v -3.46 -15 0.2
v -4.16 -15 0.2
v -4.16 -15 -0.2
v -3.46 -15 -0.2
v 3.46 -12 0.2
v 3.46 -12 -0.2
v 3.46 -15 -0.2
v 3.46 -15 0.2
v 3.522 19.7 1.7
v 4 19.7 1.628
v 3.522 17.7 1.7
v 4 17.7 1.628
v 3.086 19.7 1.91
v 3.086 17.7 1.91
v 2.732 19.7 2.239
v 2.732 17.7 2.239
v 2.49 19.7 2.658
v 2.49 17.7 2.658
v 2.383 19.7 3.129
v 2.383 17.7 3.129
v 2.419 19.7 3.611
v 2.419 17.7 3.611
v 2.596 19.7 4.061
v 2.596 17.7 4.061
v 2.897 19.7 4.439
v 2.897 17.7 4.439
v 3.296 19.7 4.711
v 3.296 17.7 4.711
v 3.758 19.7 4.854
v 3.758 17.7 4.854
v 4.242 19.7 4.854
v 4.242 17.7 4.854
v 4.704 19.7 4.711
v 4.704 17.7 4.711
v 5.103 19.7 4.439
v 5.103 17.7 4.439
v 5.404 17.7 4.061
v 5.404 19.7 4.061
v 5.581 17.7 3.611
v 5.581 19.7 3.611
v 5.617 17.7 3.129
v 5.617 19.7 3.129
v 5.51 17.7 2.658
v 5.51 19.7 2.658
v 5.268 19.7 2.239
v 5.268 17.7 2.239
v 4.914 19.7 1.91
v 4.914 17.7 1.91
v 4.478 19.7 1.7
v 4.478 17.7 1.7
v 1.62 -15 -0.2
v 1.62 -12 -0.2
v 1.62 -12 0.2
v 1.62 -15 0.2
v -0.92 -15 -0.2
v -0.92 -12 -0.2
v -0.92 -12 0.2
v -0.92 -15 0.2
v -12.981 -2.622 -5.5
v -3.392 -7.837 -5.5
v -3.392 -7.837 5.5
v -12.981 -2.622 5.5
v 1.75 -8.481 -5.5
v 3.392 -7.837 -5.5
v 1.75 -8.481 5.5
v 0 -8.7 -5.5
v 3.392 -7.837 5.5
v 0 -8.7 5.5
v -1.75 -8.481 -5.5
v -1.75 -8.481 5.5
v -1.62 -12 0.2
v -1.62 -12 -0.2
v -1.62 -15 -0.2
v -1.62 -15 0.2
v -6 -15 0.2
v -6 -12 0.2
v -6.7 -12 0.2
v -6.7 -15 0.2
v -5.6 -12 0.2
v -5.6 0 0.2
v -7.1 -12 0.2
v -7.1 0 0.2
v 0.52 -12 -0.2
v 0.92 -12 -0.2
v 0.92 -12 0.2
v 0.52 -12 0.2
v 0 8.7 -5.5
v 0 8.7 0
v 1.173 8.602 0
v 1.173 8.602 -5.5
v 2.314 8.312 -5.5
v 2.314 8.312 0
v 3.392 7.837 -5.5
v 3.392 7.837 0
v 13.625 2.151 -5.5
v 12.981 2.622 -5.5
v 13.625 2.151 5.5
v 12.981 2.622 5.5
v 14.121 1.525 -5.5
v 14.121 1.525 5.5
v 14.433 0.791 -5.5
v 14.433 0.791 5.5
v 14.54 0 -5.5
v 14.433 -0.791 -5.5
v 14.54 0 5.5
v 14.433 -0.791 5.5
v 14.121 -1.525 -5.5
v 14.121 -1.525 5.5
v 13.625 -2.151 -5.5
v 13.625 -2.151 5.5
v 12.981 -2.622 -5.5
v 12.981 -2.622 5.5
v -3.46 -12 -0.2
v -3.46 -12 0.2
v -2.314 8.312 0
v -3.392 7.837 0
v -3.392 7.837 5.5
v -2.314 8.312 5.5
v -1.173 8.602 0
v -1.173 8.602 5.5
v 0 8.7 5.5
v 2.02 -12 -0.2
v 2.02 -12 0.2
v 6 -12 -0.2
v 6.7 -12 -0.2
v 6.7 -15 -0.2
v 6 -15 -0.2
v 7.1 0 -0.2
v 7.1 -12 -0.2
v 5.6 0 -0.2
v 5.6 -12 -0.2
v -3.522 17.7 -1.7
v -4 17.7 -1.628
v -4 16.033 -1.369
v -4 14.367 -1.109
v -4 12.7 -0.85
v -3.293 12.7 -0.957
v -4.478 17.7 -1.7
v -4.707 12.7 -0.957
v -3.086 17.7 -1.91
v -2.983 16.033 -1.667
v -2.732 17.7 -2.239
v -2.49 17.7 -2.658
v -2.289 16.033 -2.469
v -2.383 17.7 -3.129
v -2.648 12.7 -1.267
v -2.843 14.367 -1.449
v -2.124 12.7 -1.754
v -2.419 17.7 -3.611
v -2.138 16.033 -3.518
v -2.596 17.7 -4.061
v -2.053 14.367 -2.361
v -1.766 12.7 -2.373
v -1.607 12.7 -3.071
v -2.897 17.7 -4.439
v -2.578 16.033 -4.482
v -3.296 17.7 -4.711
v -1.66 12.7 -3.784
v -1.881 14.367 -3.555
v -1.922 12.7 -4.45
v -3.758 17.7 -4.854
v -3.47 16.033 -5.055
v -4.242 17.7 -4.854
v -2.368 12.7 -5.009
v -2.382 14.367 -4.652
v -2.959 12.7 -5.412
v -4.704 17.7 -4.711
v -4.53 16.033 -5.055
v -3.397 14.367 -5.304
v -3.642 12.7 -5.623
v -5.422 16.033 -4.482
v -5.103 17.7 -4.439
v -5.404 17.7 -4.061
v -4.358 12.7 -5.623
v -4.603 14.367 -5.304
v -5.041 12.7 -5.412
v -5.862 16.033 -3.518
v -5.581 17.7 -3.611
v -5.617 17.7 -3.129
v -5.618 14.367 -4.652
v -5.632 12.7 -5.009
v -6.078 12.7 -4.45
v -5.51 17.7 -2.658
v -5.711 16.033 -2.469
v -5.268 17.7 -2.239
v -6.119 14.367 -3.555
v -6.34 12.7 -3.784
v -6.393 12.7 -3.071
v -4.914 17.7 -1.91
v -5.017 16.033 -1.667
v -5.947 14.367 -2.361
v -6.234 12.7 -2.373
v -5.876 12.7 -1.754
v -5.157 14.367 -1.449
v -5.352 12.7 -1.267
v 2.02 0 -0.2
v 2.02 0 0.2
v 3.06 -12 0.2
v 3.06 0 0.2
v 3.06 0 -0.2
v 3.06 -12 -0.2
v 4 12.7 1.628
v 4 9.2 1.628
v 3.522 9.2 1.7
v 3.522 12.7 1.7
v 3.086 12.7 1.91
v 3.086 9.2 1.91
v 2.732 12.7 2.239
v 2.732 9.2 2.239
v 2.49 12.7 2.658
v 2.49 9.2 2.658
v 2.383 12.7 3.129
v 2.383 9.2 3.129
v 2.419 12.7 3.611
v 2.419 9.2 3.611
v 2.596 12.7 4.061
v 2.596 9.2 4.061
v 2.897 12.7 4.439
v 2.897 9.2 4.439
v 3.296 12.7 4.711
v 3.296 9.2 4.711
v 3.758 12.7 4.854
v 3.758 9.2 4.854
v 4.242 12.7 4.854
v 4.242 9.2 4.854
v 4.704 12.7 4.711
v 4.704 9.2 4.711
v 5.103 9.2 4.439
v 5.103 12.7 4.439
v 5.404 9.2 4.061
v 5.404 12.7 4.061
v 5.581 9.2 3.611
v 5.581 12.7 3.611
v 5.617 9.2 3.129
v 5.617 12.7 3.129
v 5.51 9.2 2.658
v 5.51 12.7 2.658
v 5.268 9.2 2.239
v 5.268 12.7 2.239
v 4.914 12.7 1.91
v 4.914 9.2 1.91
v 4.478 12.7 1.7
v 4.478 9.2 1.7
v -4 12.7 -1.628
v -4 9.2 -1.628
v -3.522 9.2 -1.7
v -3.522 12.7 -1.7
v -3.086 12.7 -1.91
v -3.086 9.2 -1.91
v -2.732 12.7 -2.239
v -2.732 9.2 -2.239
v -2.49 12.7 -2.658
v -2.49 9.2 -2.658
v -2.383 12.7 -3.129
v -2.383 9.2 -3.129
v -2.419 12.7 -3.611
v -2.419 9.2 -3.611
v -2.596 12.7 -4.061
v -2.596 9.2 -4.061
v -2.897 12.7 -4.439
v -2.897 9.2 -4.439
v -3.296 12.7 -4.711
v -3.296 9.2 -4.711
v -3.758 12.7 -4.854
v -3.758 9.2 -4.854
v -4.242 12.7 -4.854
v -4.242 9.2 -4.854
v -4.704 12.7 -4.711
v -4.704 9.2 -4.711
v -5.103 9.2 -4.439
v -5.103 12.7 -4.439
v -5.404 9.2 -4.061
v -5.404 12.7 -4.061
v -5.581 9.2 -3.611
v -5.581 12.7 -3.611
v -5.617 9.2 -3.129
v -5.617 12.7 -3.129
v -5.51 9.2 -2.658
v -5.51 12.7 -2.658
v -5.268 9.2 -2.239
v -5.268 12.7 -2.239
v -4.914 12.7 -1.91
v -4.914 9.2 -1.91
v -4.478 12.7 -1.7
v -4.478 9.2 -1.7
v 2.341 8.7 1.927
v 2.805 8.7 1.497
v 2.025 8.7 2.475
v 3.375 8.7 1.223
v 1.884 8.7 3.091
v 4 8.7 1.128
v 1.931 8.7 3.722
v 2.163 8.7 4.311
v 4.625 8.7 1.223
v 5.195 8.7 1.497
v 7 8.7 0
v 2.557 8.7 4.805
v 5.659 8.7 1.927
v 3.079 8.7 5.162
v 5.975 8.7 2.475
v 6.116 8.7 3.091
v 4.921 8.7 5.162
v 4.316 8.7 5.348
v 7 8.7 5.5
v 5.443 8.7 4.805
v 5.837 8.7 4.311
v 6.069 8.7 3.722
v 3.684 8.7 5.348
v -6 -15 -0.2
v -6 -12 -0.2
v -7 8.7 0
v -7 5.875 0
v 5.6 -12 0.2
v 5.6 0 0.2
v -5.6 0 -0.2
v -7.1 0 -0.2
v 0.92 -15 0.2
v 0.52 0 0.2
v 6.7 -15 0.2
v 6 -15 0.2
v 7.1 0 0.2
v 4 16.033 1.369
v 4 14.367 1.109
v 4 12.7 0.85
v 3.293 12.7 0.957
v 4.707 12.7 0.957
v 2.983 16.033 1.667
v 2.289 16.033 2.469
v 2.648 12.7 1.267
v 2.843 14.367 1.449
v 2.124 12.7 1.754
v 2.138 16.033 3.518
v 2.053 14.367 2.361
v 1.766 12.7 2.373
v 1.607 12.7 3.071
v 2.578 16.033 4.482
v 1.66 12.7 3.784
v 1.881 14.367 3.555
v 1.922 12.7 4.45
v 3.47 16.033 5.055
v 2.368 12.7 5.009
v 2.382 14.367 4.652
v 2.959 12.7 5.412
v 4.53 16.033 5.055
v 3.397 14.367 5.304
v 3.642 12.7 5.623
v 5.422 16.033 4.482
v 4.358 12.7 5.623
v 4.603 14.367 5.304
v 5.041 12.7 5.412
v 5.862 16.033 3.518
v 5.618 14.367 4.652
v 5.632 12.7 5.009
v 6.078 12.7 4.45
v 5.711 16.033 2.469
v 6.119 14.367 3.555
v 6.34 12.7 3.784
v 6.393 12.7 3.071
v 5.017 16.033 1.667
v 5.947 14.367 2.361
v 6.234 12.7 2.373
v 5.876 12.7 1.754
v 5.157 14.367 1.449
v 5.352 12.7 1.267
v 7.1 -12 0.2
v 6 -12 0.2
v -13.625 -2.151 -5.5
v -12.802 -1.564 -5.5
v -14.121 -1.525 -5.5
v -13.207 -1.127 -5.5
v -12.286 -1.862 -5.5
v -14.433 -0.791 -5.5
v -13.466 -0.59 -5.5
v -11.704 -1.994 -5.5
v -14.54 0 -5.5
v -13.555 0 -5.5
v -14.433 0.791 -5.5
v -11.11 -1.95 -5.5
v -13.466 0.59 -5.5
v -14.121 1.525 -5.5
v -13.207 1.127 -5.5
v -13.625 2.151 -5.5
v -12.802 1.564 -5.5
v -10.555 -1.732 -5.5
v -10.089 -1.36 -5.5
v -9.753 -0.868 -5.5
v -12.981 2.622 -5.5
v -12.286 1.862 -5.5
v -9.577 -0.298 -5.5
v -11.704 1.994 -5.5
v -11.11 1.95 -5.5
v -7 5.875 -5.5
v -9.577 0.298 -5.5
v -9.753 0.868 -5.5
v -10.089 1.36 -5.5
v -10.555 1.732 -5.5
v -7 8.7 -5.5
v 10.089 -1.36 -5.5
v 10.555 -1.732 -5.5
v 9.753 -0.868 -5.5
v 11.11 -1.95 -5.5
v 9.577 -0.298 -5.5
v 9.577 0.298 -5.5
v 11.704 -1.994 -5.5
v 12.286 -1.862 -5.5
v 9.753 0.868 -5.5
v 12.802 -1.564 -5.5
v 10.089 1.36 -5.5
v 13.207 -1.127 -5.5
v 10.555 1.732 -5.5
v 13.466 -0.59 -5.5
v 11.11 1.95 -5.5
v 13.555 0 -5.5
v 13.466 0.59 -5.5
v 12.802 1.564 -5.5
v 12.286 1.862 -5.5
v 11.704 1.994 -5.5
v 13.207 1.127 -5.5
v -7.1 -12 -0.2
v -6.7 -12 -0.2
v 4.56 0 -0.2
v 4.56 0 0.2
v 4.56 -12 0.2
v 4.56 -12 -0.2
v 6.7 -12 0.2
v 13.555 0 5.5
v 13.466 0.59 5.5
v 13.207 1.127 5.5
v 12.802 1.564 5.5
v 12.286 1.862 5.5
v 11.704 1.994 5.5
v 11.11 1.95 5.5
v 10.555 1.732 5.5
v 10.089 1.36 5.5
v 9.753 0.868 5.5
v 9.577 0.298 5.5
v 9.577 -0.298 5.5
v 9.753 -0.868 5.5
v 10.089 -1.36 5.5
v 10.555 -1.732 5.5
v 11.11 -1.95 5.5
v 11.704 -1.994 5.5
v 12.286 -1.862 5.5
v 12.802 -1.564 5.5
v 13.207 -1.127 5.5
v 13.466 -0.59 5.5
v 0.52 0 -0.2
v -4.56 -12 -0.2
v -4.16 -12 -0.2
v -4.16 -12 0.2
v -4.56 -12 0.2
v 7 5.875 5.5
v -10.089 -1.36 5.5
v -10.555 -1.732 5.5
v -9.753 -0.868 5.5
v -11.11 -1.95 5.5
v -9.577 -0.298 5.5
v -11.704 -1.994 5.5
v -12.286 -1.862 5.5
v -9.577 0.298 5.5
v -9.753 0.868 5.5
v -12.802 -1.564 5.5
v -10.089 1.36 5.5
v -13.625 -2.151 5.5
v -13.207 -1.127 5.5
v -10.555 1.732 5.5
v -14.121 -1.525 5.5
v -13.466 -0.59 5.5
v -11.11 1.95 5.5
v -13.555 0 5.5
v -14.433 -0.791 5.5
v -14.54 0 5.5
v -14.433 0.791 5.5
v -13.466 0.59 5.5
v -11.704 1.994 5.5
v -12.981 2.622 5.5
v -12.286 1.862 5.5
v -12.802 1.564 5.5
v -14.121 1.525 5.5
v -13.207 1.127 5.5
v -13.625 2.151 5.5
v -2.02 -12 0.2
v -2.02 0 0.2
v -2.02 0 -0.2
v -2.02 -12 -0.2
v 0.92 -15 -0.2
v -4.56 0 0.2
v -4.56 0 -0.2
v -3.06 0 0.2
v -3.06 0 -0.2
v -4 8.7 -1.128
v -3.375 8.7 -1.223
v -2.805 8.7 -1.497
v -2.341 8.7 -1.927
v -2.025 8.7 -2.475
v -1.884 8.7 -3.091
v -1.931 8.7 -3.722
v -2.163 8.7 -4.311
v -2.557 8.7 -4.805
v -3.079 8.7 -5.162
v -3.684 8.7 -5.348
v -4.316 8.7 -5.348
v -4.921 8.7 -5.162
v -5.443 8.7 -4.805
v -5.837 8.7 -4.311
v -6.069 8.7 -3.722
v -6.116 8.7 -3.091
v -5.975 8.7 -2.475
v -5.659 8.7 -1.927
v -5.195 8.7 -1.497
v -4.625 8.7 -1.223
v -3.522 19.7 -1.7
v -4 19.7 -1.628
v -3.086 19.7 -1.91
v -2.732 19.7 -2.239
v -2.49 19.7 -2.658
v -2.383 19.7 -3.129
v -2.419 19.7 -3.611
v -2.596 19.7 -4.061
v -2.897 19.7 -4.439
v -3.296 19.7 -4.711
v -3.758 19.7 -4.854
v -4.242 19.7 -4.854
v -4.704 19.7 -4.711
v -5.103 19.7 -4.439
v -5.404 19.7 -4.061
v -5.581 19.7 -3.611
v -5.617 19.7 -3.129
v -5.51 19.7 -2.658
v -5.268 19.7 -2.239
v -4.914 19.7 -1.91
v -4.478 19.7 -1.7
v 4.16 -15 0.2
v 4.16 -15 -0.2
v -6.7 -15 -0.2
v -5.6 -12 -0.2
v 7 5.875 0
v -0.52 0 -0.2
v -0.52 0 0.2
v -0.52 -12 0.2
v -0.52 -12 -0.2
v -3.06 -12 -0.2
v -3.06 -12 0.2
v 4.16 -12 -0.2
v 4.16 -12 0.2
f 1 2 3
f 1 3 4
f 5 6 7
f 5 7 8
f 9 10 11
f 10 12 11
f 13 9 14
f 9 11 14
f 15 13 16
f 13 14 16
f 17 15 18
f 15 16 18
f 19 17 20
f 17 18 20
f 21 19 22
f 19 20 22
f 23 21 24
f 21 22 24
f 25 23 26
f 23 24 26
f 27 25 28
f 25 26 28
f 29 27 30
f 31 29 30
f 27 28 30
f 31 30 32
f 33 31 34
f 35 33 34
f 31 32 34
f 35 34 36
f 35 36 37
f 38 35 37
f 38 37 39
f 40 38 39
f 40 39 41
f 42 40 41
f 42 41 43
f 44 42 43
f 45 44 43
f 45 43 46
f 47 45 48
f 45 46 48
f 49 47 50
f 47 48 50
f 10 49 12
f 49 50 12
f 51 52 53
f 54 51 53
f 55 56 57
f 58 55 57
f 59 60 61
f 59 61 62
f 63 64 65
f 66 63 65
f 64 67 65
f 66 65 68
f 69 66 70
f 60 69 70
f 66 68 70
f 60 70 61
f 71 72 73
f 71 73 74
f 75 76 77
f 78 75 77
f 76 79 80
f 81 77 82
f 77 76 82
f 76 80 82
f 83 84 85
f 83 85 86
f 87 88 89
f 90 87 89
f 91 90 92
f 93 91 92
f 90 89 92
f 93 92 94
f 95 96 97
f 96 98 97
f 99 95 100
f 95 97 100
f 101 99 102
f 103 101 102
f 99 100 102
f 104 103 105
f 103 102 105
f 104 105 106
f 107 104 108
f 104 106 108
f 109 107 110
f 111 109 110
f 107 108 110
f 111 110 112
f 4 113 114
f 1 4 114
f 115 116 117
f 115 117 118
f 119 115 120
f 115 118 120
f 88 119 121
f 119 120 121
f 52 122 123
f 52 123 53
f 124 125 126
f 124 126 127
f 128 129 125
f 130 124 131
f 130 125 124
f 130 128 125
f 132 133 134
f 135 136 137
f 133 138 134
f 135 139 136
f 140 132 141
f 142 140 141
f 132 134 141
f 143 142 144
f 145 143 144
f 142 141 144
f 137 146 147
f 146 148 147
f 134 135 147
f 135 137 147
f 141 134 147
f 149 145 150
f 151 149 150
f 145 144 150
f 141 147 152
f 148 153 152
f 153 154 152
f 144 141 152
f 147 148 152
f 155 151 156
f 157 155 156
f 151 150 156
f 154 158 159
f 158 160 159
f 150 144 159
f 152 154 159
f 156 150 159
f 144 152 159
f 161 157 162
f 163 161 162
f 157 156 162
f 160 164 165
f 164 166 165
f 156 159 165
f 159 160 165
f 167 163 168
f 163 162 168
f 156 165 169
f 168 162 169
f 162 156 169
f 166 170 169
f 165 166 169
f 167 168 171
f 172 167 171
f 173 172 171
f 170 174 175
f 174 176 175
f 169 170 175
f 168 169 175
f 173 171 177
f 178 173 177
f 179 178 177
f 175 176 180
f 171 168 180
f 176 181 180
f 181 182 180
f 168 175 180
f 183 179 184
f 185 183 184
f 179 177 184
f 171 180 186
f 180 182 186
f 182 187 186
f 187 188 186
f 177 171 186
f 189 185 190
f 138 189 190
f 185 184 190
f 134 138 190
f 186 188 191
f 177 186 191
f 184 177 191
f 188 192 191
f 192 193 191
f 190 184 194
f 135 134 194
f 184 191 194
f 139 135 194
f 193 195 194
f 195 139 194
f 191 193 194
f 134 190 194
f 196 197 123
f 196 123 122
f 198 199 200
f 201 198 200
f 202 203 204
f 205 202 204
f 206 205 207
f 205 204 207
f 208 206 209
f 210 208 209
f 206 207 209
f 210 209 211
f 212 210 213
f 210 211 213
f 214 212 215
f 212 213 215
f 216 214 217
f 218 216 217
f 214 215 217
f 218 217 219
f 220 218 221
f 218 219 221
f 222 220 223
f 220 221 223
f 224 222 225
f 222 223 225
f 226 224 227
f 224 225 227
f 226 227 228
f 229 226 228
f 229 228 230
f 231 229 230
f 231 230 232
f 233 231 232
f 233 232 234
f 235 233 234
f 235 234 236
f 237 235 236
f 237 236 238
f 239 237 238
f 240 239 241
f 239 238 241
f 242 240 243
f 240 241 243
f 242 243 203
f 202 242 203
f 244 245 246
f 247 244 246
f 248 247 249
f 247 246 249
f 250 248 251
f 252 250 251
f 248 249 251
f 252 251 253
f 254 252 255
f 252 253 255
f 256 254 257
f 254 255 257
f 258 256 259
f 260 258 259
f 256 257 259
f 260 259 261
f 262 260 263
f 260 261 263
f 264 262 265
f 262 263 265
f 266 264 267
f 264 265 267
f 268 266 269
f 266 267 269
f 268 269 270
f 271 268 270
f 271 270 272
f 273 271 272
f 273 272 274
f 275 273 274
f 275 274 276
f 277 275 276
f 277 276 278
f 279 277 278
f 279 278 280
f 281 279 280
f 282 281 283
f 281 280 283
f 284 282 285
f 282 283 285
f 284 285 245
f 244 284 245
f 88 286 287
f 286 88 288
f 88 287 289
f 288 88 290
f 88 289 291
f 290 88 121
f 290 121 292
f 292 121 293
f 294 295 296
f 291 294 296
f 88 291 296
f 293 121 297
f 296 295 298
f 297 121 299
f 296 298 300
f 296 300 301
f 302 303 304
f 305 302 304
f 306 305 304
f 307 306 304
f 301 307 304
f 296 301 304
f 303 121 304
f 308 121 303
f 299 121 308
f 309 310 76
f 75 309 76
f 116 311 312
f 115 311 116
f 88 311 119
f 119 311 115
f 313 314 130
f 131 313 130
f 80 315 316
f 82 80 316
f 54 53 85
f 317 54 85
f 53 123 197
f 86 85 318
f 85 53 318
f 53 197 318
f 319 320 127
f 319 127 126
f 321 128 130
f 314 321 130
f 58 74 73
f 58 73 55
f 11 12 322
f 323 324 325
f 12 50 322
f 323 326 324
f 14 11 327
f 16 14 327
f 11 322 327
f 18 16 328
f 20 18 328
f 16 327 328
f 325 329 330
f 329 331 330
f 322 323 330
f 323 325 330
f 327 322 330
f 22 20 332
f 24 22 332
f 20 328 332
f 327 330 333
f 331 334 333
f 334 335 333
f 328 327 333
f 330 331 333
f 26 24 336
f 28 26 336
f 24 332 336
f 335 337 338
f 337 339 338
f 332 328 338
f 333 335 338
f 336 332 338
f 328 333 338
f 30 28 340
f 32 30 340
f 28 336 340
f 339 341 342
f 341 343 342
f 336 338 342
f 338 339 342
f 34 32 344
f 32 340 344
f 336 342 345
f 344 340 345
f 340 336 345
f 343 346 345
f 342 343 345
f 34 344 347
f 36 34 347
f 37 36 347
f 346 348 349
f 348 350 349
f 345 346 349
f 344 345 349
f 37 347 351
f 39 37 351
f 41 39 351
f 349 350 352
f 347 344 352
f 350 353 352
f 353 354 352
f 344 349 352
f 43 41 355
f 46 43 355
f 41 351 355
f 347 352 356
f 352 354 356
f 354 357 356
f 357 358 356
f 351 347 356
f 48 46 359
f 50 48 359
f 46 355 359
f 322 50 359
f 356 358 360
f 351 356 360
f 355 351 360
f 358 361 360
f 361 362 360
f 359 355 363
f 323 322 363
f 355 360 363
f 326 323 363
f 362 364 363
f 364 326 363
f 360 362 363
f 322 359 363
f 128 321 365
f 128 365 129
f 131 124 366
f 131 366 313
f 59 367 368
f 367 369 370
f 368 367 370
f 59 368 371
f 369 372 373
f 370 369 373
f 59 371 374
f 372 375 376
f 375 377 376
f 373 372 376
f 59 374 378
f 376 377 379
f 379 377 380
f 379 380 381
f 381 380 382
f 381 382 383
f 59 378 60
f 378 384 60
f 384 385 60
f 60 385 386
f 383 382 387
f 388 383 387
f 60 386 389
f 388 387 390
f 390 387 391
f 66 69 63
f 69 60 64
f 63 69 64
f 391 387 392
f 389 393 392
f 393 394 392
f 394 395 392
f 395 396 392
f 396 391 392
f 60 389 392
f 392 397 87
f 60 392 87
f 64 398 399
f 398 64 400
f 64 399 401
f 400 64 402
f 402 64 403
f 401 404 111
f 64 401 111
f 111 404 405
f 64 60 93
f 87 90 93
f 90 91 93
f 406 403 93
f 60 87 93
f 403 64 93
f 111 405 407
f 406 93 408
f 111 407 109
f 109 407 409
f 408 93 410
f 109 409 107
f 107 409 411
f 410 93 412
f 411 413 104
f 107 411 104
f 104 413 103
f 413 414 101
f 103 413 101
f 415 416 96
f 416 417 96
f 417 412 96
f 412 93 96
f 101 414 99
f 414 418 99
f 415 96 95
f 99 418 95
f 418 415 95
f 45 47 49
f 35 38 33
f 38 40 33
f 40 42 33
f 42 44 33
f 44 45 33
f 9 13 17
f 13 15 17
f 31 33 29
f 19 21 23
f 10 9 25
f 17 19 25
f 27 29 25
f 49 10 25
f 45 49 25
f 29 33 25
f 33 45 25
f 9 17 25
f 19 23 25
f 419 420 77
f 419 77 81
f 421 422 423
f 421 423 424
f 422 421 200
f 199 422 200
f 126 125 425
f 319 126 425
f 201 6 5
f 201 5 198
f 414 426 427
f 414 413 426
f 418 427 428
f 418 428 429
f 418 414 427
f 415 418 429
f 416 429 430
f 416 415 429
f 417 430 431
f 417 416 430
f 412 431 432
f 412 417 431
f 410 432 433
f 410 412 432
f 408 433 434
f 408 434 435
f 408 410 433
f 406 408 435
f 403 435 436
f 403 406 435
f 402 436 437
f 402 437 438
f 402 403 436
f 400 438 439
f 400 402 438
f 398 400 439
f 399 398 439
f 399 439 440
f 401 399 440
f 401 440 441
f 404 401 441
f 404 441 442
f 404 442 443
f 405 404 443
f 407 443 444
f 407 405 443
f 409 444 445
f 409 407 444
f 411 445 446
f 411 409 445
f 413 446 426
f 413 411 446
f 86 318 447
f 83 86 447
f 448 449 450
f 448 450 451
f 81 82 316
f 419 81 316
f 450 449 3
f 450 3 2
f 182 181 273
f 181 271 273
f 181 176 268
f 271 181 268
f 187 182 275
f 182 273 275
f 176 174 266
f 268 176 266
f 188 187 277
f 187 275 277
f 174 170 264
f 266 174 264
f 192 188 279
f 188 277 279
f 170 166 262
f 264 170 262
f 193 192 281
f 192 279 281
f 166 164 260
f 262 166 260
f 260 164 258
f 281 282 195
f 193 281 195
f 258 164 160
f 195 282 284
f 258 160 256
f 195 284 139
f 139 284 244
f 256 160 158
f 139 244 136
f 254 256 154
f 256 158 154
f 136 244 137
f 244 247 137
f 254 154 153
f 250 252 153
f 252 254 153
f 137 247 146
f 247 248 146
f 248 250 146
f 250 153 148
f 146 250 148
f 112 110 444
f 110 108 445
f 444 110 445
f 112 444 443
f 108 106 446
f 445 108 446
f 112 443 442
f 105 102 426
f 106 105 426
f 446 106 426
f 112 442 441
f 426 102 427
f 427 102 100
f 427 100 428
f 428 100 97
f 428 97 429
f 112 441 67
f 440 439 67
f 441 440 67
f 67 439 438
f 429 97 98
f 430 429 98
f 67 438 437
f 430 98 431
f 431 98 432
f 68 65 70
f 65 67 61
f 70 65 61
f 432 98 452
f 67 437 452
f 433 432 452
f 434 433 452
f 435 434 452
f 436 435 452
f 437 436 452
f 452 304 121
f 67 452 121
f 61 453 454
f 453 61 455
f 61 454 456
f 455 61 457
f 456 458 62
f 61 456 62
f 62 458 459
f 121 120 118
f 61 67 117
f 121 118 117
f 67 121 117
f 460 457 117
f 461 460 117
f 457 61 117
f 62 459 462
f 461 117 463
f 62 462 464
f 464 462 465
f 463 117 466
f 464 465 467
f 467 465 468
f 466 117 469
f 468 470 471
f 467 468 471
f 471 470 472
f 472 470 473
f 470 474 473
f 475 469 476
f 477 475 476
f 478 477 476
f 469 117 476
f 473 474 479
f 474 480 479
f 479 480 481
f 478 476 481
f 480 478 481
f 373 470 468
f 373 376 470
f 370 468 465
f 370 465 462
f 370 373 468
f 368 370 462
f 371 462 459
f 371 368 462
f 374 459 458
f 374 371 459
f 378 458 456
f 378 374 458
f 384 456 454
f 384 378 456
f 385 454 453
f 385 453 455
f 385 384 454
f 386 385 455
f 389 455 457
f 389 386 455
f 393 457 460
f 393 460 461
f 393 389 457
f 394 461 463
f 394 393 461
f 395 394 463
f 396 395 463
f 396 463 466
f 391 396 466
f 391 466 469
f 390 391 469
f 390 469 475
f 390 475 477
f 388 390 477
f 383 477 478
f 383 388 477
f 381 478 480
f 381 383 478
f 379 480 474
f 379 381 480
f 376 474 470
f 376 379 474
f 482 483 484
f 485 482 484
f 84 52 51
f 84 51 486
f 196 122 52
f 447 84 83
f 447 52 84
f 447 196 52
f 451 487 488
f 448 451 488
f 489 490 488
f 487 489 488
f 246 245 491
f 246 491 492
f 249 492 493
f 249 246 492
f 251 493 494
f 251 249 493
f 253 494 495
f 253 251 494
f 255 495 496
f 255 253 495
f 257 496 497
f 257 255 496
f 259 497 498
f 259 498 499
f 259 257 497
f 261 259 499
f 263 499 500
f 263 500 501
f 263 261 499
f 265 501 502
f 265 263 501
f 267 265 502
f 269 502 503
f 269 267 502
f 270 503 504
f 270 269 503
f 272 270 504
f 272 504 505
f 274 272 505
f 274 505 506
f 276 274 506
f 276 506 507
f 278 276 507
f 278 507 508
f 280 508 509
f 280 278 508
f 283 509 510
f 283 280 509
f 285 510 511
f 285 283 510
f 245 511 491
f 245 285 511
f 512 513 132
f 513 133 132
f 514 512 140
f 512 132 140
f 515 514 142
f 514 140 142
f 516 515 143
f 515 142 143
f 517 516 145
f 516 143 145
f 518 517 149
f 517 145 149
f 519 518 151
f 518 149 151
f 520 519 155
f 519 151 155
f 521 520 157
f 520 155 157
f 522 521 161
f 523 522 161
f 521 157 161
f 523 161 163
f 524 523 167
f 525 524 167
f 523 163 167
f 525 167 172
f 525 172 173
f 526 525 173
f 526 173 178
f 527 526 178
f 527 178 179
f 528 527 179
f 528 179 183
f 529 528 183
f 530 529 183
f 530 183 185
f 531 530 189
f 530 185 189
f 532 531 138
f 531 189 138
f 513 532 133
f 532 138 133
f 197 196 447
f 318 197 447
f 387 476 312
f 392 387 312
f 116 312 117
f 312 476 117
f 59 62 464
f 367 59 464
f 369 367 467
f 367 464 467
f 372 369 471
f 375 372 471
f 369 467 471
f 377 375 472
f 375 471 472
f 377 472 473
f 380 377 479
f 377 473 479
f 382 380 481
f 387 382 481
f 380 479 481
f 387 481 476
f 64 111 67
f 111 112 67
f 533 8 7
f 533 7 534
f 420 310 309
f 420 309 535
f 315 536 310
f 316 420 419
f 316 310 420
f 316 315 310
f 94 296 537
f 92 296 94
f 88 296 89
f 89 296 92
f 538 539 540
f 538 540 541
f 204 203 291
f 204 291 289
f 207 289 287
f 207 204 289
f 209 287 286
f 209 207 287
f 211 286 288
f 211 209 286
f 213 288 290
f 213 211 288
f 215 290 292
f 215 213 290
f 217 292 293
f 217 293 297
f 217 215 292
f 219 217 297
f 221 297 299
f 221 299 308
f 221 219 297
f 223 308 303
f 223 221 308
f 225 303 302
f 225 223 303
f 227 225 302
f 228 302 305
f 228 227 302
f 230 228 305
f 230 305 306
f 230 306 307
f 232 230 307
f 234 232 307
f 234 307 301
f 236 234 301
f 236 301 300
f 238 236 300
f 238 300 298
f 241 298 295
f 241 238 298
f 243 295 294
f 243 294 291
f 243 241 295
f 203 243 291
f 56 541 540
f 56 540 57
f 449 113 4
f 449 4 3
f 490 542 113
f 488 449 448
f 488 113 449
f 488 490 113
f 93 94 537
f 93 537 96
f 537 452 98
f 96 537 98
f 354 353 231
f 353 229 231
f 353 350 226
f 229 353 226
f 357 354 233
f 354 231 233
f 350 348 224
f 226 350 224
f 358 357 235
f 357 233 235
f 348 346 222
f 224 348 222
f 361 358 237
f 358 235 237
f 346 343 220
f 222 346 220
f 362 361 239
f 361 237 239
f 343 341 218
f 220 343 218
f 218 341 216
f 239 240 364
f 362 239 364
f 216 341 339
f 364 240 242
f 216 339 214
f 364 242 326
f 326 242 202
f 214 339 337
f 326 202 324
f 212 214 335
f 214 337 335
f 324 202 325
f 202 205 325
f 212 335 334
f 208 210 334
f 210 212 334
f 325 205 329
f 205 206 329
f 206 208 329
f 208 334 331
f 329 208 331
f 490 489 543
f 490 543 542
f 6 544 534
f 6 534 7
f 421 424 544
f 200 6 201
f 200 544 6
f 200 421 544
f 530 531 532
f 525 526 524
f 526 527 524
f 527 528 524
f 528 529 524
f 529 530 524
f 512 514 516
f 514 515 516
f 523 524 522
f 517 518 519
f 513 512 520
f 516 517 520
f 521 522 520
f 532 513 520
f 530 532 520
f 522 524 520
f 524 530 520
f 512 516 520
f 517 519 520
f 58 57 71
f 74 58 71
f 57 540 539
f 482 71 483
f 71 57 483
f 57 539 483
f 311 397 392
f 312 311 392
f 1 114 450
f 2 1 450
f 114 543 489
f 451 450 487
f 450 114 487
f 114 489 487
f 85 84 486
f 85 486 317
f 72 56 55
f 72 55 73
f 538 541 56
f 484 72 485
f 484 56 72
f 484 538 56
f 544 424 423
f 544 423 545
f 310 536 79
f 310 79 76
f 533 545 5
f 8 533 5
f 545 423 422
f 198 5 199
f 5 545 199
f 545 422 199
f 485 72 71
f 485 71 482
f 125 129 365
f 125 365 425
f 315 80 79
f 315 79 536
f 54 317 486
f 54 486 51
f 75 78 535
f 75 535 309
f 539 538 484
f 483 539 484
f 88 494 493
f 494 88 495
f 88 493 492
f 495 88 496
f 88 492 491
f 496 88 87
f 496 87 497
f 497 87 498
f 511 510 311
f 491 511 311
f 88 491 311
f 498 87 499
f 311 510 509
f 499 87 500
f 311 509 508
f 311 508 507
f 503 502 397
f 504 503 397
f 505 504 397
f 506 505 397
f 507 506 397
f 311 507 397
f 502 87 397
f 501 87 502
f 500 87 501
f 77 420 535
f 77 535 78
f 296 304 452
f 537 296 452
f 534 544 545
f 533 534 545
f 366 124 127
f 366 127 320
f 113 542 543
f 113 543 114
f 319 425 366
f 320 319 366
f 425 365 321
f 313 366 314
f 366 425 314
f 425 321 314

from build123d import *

# Parameters (mm, degrees)
ESQUISSE1_R                  = 2
BOSS_EXTRU_1_DEPTH           = 5.5
BOSS_EXTRU_3_DEPTH           = 5.5
R_P_TITION_CIRCULAIRE1_COUNT = 2
CHANFREIN1_SIZE              = 0.5
ESQUISSE5_W                  = 1.5
ESQUISSE5_H                  = 0.4
BOSS_EXTRU_4_DEPTH           = 12
BOSS_EXTRU_4_2_DEPTH         = 12
BOSS_EXTRU_4_3_DEPTH         = 12
BOSS_EXTRU_4_4_DEPTH         = 12
BOSS_EXTRU_4_5_DEPTH         = 12
BOSS_EXTRU_4_6_DEPTH         = 12
ESQUISSE6_W                  = 0.7
ESQUISSE6_H                  = 0.4
BOSS_EXTRU_5_DEPTH           = 3


with BuildPart() as part:
    # Esquisse1 → Boss.-Extru.1 (new, symmetric)
    with BuildSketch(Plane.XY):
        with BuildLine():
            Line((3.391918261, 7.837323774), (12.981118348, 2.622291261))
            ThreePointArc((12.981118348, 2.622291261), (14.54, 0), (12.981118348, -2.622291261))
            Line((12.981118348, -2.622291261), (3.391918261, -7.837323774))
            ThreePointArc((3.391918261, -7.837323774), (0, -8.7), (-3.391918261, -7.837323774))
            Line((-3.391918261, -7.837323774), (-12.981118348, -2.622291261))
            ThreePointArc((-12.981118348, -2.622291261), (-14.54, 0), (-12.981118348, 2.622291261))
            Line((-12.981118348, 2.622291261), (-3.391918261, 7.837323774))
            ThreePointArc((-3.391918261, 7.837323774), (0, 8.7), (3.391918261, 7.837323774))
        make_face()
        with Locations((11.555, 0)):
            Circle(ESQUISSE1_R, mode=Mode.SUBTRACT)
        with Locations((-11.555, 0)):
            Circle(ESQUISSE1_R, mode=Mode.SUBTRACT)
    extrude(amount=BOSS_EXTRU_1_DEPTH, both=True)

    # Esquisse3 → Boss.-Extru.3 (add)
    with BuildSketch(Plane.XY.offset(5.5)):
        with BuildLine():
            Line((0, 8.7), (7, 8.7))
            Line((7, 8.7), (7, 5.875088821))
            Line((7, 5.875088821), (3.391918261, 7.837323774))
            ThreePointArc((3.391918261, 7.837323774), (1.749951411, 8.480951731), (0, 8.7))
        make_face()
    boss_extru_3 = extrude(amount=-BOSS_EXTRU_3_DEPTH)

    # Esquisse4 → Révolution1 (revolve)
    with BuildSketch(Plane.XY.offset(3.25)):
        Polygon((4, 8.7), (4, 19.7), (2.378292997, 19.7), (2.378292997, 17.7), (1.6, 12.7), (2.378292997, 12.7), (2.378292997, 8.7), align=None)
    r_volution1 = revolve(axis=Axis((4, 8.7, 3.25), (0, 1, 0)))

    # Répétition circulaire1: Boss.-Extru.3, Révolution1 ×2 about axis
    r_p_tition_circulaire1_axis = Axis((0, -10.12, 0), (0, 1, 0))
    add([boss_extru_3.rotate(r_p_tition_circulaire1_axis, i * 360 / R_P_TITION_CIRCULAIRE1_COUNT) for i in range(1, R_P_TITION_CIRCULAIRE1_COUNT)])
    add([r_volution1.rotate(r_p_tition_circulaire1_axis, i * 360 / R_P_TITION_CIRCULAIRE1_COUNT) for i in range(1, R_P_TITION_CIRCULAIRE1_COUNT)])

    # Chanfrein1
    chanfrein1_edges = [part.edges().sort_by_distance(p)[0] for p in [
        (-5.621707003, 8.7, -3.25),
        (5.621707003, 8.7, 3.25),
    ]]
    chamfer(chanfrein1_edges, length=CHANFREIN1_SIZE)


with BuildPart() as body_2:
    # Esquisse5 → Boss.-Extru.4 (new body)
    with BuildSketch(Plane(origin=(0, 0, 0), x_dir=(-1, 0, 0), z_dir=(0, -1, 0))):
        with Locations((1.27, 0)):
            Rectangle(ESQUISSE5_W, ESQUISSE5_H)
    extrude(amount=BOSS_EXTRU_4_DEPTH)



with BuildPart() as body_3:
    # Esquisse5 → Boss.-Extru.4 2 (new body)
    with BuildSketch(Plane(origin=(0, 0, 0), x_dir=(-1, 0, 0), z_dir=(0, -1, 0))):
        with Locations((3.81, 0)):
            Rectangle(ESQUISSE5_W, ESQUISSE5_H)
    extrude(amount=BOSS_EXTRU_4_2_DEPTH)


with BuildPart() as body_4:
    # Esquisse5 → Boss.-Extru.4 3 (new body)
    with BuildSketch(Plane(origin=(0, 0, 0), x_dir=(-1, 0, 0), z_dir=(0, -1, 0))):
        with Locations((6.35, 0)):
            Rectangle(ESQUISSE5_W, ESQUISSE5_H)
    extrude(amount=BOSS_EXTRU_4_3_DEPTH)


with BuildPart() as body_5:
    # Esquisse5 → Boss.-Extru.4 4 (new body)
    with BuildSketch(Plane(origin=(0, 0, 0), x_dir=(-1, 0, 0), z_dir=(0, -1, 0))):
        with Locations((-6.35, 0)):
            Rectangle(ESQUISSE5_W, ESQUISSE5_H)
    extrude(amount=BOSS_EXTRU_4_4_DEPTH)


with BuildPart() as body_6:
    # Esquisse5 → Boss.-Extru.4 5 (new body)
    with BuildSketch(Plane(origin=(0, 0, 0), x_dir=(-1, 0, 0), z_dir=(0, -1, 0))):
        with Locations((-3.81, 0)):
            Rectangle(ESQUISSE5_W, ESQUISSE5_H)
    extrude(amount=BOSS_EXTRU_4_5_DEPTH)


with BuildPart() as body_7:
    # Esquisse5 → Boss.-Extru.4 6 (new body)
    with BuildSketch(Plane(origin=(0, 0, 0), x_dir=(-1, 0, 0), z_dir=(0, -1, 0))):
        with Locations((-1.27, 0)):
            Rectangle(ESQUISSE5_W, ESQUISSE5_H)
    extrude(amount=BOSS_EXTRU_4_6_DEPTH)


with BuildPart() as body_2_1:
    add(body_2.part)

    add(body_3.part)  # Boss.-Extru.5 merges body 3

    add(body_4.part)  # Boss.-Extru.5 merges body 4

    add(body_5.part)  # Boss.-Extru.5 merges body 5

    add(body_6.part)  # Boss.-Extru.5 merges body 6

    add(body_7.part)  # Boss.-Extru.5 merges body 7
    # Esquisse6 → Boss.-Extru.5 (add)
    with BuildSketch(Plane.XZ.offset(12)):
        with Locations((6.35, 0)):
            Rectangle(ESQUISSE6_W, ESQUISSE6_H)
        with Locations((3.81, 0)):
            Rectangle(ESQUISSE6_W, ESQUISSE6_H)
        with Locations((1.27, 0)):
            Rectangle(ESQUISSE6_W, ESQUISSE6_H)
        with Locations((-1.27, 0)):
            Rectangle(ESQUISSE6_W, ESQUISSE6_H)
        with Locations((-3.81, 0)):
            Rectangle(ESQUISSE6_W, ESQUISSE6_H)
        with Locations((-6.35, 0)):
            Rectangle(ESQUISSE6_W, ESQUISSE6_H)
    extrude(amount=BOSS_EXTRU_5_DEPTH)


solid = Compound([part.part, body_2_1.part])
